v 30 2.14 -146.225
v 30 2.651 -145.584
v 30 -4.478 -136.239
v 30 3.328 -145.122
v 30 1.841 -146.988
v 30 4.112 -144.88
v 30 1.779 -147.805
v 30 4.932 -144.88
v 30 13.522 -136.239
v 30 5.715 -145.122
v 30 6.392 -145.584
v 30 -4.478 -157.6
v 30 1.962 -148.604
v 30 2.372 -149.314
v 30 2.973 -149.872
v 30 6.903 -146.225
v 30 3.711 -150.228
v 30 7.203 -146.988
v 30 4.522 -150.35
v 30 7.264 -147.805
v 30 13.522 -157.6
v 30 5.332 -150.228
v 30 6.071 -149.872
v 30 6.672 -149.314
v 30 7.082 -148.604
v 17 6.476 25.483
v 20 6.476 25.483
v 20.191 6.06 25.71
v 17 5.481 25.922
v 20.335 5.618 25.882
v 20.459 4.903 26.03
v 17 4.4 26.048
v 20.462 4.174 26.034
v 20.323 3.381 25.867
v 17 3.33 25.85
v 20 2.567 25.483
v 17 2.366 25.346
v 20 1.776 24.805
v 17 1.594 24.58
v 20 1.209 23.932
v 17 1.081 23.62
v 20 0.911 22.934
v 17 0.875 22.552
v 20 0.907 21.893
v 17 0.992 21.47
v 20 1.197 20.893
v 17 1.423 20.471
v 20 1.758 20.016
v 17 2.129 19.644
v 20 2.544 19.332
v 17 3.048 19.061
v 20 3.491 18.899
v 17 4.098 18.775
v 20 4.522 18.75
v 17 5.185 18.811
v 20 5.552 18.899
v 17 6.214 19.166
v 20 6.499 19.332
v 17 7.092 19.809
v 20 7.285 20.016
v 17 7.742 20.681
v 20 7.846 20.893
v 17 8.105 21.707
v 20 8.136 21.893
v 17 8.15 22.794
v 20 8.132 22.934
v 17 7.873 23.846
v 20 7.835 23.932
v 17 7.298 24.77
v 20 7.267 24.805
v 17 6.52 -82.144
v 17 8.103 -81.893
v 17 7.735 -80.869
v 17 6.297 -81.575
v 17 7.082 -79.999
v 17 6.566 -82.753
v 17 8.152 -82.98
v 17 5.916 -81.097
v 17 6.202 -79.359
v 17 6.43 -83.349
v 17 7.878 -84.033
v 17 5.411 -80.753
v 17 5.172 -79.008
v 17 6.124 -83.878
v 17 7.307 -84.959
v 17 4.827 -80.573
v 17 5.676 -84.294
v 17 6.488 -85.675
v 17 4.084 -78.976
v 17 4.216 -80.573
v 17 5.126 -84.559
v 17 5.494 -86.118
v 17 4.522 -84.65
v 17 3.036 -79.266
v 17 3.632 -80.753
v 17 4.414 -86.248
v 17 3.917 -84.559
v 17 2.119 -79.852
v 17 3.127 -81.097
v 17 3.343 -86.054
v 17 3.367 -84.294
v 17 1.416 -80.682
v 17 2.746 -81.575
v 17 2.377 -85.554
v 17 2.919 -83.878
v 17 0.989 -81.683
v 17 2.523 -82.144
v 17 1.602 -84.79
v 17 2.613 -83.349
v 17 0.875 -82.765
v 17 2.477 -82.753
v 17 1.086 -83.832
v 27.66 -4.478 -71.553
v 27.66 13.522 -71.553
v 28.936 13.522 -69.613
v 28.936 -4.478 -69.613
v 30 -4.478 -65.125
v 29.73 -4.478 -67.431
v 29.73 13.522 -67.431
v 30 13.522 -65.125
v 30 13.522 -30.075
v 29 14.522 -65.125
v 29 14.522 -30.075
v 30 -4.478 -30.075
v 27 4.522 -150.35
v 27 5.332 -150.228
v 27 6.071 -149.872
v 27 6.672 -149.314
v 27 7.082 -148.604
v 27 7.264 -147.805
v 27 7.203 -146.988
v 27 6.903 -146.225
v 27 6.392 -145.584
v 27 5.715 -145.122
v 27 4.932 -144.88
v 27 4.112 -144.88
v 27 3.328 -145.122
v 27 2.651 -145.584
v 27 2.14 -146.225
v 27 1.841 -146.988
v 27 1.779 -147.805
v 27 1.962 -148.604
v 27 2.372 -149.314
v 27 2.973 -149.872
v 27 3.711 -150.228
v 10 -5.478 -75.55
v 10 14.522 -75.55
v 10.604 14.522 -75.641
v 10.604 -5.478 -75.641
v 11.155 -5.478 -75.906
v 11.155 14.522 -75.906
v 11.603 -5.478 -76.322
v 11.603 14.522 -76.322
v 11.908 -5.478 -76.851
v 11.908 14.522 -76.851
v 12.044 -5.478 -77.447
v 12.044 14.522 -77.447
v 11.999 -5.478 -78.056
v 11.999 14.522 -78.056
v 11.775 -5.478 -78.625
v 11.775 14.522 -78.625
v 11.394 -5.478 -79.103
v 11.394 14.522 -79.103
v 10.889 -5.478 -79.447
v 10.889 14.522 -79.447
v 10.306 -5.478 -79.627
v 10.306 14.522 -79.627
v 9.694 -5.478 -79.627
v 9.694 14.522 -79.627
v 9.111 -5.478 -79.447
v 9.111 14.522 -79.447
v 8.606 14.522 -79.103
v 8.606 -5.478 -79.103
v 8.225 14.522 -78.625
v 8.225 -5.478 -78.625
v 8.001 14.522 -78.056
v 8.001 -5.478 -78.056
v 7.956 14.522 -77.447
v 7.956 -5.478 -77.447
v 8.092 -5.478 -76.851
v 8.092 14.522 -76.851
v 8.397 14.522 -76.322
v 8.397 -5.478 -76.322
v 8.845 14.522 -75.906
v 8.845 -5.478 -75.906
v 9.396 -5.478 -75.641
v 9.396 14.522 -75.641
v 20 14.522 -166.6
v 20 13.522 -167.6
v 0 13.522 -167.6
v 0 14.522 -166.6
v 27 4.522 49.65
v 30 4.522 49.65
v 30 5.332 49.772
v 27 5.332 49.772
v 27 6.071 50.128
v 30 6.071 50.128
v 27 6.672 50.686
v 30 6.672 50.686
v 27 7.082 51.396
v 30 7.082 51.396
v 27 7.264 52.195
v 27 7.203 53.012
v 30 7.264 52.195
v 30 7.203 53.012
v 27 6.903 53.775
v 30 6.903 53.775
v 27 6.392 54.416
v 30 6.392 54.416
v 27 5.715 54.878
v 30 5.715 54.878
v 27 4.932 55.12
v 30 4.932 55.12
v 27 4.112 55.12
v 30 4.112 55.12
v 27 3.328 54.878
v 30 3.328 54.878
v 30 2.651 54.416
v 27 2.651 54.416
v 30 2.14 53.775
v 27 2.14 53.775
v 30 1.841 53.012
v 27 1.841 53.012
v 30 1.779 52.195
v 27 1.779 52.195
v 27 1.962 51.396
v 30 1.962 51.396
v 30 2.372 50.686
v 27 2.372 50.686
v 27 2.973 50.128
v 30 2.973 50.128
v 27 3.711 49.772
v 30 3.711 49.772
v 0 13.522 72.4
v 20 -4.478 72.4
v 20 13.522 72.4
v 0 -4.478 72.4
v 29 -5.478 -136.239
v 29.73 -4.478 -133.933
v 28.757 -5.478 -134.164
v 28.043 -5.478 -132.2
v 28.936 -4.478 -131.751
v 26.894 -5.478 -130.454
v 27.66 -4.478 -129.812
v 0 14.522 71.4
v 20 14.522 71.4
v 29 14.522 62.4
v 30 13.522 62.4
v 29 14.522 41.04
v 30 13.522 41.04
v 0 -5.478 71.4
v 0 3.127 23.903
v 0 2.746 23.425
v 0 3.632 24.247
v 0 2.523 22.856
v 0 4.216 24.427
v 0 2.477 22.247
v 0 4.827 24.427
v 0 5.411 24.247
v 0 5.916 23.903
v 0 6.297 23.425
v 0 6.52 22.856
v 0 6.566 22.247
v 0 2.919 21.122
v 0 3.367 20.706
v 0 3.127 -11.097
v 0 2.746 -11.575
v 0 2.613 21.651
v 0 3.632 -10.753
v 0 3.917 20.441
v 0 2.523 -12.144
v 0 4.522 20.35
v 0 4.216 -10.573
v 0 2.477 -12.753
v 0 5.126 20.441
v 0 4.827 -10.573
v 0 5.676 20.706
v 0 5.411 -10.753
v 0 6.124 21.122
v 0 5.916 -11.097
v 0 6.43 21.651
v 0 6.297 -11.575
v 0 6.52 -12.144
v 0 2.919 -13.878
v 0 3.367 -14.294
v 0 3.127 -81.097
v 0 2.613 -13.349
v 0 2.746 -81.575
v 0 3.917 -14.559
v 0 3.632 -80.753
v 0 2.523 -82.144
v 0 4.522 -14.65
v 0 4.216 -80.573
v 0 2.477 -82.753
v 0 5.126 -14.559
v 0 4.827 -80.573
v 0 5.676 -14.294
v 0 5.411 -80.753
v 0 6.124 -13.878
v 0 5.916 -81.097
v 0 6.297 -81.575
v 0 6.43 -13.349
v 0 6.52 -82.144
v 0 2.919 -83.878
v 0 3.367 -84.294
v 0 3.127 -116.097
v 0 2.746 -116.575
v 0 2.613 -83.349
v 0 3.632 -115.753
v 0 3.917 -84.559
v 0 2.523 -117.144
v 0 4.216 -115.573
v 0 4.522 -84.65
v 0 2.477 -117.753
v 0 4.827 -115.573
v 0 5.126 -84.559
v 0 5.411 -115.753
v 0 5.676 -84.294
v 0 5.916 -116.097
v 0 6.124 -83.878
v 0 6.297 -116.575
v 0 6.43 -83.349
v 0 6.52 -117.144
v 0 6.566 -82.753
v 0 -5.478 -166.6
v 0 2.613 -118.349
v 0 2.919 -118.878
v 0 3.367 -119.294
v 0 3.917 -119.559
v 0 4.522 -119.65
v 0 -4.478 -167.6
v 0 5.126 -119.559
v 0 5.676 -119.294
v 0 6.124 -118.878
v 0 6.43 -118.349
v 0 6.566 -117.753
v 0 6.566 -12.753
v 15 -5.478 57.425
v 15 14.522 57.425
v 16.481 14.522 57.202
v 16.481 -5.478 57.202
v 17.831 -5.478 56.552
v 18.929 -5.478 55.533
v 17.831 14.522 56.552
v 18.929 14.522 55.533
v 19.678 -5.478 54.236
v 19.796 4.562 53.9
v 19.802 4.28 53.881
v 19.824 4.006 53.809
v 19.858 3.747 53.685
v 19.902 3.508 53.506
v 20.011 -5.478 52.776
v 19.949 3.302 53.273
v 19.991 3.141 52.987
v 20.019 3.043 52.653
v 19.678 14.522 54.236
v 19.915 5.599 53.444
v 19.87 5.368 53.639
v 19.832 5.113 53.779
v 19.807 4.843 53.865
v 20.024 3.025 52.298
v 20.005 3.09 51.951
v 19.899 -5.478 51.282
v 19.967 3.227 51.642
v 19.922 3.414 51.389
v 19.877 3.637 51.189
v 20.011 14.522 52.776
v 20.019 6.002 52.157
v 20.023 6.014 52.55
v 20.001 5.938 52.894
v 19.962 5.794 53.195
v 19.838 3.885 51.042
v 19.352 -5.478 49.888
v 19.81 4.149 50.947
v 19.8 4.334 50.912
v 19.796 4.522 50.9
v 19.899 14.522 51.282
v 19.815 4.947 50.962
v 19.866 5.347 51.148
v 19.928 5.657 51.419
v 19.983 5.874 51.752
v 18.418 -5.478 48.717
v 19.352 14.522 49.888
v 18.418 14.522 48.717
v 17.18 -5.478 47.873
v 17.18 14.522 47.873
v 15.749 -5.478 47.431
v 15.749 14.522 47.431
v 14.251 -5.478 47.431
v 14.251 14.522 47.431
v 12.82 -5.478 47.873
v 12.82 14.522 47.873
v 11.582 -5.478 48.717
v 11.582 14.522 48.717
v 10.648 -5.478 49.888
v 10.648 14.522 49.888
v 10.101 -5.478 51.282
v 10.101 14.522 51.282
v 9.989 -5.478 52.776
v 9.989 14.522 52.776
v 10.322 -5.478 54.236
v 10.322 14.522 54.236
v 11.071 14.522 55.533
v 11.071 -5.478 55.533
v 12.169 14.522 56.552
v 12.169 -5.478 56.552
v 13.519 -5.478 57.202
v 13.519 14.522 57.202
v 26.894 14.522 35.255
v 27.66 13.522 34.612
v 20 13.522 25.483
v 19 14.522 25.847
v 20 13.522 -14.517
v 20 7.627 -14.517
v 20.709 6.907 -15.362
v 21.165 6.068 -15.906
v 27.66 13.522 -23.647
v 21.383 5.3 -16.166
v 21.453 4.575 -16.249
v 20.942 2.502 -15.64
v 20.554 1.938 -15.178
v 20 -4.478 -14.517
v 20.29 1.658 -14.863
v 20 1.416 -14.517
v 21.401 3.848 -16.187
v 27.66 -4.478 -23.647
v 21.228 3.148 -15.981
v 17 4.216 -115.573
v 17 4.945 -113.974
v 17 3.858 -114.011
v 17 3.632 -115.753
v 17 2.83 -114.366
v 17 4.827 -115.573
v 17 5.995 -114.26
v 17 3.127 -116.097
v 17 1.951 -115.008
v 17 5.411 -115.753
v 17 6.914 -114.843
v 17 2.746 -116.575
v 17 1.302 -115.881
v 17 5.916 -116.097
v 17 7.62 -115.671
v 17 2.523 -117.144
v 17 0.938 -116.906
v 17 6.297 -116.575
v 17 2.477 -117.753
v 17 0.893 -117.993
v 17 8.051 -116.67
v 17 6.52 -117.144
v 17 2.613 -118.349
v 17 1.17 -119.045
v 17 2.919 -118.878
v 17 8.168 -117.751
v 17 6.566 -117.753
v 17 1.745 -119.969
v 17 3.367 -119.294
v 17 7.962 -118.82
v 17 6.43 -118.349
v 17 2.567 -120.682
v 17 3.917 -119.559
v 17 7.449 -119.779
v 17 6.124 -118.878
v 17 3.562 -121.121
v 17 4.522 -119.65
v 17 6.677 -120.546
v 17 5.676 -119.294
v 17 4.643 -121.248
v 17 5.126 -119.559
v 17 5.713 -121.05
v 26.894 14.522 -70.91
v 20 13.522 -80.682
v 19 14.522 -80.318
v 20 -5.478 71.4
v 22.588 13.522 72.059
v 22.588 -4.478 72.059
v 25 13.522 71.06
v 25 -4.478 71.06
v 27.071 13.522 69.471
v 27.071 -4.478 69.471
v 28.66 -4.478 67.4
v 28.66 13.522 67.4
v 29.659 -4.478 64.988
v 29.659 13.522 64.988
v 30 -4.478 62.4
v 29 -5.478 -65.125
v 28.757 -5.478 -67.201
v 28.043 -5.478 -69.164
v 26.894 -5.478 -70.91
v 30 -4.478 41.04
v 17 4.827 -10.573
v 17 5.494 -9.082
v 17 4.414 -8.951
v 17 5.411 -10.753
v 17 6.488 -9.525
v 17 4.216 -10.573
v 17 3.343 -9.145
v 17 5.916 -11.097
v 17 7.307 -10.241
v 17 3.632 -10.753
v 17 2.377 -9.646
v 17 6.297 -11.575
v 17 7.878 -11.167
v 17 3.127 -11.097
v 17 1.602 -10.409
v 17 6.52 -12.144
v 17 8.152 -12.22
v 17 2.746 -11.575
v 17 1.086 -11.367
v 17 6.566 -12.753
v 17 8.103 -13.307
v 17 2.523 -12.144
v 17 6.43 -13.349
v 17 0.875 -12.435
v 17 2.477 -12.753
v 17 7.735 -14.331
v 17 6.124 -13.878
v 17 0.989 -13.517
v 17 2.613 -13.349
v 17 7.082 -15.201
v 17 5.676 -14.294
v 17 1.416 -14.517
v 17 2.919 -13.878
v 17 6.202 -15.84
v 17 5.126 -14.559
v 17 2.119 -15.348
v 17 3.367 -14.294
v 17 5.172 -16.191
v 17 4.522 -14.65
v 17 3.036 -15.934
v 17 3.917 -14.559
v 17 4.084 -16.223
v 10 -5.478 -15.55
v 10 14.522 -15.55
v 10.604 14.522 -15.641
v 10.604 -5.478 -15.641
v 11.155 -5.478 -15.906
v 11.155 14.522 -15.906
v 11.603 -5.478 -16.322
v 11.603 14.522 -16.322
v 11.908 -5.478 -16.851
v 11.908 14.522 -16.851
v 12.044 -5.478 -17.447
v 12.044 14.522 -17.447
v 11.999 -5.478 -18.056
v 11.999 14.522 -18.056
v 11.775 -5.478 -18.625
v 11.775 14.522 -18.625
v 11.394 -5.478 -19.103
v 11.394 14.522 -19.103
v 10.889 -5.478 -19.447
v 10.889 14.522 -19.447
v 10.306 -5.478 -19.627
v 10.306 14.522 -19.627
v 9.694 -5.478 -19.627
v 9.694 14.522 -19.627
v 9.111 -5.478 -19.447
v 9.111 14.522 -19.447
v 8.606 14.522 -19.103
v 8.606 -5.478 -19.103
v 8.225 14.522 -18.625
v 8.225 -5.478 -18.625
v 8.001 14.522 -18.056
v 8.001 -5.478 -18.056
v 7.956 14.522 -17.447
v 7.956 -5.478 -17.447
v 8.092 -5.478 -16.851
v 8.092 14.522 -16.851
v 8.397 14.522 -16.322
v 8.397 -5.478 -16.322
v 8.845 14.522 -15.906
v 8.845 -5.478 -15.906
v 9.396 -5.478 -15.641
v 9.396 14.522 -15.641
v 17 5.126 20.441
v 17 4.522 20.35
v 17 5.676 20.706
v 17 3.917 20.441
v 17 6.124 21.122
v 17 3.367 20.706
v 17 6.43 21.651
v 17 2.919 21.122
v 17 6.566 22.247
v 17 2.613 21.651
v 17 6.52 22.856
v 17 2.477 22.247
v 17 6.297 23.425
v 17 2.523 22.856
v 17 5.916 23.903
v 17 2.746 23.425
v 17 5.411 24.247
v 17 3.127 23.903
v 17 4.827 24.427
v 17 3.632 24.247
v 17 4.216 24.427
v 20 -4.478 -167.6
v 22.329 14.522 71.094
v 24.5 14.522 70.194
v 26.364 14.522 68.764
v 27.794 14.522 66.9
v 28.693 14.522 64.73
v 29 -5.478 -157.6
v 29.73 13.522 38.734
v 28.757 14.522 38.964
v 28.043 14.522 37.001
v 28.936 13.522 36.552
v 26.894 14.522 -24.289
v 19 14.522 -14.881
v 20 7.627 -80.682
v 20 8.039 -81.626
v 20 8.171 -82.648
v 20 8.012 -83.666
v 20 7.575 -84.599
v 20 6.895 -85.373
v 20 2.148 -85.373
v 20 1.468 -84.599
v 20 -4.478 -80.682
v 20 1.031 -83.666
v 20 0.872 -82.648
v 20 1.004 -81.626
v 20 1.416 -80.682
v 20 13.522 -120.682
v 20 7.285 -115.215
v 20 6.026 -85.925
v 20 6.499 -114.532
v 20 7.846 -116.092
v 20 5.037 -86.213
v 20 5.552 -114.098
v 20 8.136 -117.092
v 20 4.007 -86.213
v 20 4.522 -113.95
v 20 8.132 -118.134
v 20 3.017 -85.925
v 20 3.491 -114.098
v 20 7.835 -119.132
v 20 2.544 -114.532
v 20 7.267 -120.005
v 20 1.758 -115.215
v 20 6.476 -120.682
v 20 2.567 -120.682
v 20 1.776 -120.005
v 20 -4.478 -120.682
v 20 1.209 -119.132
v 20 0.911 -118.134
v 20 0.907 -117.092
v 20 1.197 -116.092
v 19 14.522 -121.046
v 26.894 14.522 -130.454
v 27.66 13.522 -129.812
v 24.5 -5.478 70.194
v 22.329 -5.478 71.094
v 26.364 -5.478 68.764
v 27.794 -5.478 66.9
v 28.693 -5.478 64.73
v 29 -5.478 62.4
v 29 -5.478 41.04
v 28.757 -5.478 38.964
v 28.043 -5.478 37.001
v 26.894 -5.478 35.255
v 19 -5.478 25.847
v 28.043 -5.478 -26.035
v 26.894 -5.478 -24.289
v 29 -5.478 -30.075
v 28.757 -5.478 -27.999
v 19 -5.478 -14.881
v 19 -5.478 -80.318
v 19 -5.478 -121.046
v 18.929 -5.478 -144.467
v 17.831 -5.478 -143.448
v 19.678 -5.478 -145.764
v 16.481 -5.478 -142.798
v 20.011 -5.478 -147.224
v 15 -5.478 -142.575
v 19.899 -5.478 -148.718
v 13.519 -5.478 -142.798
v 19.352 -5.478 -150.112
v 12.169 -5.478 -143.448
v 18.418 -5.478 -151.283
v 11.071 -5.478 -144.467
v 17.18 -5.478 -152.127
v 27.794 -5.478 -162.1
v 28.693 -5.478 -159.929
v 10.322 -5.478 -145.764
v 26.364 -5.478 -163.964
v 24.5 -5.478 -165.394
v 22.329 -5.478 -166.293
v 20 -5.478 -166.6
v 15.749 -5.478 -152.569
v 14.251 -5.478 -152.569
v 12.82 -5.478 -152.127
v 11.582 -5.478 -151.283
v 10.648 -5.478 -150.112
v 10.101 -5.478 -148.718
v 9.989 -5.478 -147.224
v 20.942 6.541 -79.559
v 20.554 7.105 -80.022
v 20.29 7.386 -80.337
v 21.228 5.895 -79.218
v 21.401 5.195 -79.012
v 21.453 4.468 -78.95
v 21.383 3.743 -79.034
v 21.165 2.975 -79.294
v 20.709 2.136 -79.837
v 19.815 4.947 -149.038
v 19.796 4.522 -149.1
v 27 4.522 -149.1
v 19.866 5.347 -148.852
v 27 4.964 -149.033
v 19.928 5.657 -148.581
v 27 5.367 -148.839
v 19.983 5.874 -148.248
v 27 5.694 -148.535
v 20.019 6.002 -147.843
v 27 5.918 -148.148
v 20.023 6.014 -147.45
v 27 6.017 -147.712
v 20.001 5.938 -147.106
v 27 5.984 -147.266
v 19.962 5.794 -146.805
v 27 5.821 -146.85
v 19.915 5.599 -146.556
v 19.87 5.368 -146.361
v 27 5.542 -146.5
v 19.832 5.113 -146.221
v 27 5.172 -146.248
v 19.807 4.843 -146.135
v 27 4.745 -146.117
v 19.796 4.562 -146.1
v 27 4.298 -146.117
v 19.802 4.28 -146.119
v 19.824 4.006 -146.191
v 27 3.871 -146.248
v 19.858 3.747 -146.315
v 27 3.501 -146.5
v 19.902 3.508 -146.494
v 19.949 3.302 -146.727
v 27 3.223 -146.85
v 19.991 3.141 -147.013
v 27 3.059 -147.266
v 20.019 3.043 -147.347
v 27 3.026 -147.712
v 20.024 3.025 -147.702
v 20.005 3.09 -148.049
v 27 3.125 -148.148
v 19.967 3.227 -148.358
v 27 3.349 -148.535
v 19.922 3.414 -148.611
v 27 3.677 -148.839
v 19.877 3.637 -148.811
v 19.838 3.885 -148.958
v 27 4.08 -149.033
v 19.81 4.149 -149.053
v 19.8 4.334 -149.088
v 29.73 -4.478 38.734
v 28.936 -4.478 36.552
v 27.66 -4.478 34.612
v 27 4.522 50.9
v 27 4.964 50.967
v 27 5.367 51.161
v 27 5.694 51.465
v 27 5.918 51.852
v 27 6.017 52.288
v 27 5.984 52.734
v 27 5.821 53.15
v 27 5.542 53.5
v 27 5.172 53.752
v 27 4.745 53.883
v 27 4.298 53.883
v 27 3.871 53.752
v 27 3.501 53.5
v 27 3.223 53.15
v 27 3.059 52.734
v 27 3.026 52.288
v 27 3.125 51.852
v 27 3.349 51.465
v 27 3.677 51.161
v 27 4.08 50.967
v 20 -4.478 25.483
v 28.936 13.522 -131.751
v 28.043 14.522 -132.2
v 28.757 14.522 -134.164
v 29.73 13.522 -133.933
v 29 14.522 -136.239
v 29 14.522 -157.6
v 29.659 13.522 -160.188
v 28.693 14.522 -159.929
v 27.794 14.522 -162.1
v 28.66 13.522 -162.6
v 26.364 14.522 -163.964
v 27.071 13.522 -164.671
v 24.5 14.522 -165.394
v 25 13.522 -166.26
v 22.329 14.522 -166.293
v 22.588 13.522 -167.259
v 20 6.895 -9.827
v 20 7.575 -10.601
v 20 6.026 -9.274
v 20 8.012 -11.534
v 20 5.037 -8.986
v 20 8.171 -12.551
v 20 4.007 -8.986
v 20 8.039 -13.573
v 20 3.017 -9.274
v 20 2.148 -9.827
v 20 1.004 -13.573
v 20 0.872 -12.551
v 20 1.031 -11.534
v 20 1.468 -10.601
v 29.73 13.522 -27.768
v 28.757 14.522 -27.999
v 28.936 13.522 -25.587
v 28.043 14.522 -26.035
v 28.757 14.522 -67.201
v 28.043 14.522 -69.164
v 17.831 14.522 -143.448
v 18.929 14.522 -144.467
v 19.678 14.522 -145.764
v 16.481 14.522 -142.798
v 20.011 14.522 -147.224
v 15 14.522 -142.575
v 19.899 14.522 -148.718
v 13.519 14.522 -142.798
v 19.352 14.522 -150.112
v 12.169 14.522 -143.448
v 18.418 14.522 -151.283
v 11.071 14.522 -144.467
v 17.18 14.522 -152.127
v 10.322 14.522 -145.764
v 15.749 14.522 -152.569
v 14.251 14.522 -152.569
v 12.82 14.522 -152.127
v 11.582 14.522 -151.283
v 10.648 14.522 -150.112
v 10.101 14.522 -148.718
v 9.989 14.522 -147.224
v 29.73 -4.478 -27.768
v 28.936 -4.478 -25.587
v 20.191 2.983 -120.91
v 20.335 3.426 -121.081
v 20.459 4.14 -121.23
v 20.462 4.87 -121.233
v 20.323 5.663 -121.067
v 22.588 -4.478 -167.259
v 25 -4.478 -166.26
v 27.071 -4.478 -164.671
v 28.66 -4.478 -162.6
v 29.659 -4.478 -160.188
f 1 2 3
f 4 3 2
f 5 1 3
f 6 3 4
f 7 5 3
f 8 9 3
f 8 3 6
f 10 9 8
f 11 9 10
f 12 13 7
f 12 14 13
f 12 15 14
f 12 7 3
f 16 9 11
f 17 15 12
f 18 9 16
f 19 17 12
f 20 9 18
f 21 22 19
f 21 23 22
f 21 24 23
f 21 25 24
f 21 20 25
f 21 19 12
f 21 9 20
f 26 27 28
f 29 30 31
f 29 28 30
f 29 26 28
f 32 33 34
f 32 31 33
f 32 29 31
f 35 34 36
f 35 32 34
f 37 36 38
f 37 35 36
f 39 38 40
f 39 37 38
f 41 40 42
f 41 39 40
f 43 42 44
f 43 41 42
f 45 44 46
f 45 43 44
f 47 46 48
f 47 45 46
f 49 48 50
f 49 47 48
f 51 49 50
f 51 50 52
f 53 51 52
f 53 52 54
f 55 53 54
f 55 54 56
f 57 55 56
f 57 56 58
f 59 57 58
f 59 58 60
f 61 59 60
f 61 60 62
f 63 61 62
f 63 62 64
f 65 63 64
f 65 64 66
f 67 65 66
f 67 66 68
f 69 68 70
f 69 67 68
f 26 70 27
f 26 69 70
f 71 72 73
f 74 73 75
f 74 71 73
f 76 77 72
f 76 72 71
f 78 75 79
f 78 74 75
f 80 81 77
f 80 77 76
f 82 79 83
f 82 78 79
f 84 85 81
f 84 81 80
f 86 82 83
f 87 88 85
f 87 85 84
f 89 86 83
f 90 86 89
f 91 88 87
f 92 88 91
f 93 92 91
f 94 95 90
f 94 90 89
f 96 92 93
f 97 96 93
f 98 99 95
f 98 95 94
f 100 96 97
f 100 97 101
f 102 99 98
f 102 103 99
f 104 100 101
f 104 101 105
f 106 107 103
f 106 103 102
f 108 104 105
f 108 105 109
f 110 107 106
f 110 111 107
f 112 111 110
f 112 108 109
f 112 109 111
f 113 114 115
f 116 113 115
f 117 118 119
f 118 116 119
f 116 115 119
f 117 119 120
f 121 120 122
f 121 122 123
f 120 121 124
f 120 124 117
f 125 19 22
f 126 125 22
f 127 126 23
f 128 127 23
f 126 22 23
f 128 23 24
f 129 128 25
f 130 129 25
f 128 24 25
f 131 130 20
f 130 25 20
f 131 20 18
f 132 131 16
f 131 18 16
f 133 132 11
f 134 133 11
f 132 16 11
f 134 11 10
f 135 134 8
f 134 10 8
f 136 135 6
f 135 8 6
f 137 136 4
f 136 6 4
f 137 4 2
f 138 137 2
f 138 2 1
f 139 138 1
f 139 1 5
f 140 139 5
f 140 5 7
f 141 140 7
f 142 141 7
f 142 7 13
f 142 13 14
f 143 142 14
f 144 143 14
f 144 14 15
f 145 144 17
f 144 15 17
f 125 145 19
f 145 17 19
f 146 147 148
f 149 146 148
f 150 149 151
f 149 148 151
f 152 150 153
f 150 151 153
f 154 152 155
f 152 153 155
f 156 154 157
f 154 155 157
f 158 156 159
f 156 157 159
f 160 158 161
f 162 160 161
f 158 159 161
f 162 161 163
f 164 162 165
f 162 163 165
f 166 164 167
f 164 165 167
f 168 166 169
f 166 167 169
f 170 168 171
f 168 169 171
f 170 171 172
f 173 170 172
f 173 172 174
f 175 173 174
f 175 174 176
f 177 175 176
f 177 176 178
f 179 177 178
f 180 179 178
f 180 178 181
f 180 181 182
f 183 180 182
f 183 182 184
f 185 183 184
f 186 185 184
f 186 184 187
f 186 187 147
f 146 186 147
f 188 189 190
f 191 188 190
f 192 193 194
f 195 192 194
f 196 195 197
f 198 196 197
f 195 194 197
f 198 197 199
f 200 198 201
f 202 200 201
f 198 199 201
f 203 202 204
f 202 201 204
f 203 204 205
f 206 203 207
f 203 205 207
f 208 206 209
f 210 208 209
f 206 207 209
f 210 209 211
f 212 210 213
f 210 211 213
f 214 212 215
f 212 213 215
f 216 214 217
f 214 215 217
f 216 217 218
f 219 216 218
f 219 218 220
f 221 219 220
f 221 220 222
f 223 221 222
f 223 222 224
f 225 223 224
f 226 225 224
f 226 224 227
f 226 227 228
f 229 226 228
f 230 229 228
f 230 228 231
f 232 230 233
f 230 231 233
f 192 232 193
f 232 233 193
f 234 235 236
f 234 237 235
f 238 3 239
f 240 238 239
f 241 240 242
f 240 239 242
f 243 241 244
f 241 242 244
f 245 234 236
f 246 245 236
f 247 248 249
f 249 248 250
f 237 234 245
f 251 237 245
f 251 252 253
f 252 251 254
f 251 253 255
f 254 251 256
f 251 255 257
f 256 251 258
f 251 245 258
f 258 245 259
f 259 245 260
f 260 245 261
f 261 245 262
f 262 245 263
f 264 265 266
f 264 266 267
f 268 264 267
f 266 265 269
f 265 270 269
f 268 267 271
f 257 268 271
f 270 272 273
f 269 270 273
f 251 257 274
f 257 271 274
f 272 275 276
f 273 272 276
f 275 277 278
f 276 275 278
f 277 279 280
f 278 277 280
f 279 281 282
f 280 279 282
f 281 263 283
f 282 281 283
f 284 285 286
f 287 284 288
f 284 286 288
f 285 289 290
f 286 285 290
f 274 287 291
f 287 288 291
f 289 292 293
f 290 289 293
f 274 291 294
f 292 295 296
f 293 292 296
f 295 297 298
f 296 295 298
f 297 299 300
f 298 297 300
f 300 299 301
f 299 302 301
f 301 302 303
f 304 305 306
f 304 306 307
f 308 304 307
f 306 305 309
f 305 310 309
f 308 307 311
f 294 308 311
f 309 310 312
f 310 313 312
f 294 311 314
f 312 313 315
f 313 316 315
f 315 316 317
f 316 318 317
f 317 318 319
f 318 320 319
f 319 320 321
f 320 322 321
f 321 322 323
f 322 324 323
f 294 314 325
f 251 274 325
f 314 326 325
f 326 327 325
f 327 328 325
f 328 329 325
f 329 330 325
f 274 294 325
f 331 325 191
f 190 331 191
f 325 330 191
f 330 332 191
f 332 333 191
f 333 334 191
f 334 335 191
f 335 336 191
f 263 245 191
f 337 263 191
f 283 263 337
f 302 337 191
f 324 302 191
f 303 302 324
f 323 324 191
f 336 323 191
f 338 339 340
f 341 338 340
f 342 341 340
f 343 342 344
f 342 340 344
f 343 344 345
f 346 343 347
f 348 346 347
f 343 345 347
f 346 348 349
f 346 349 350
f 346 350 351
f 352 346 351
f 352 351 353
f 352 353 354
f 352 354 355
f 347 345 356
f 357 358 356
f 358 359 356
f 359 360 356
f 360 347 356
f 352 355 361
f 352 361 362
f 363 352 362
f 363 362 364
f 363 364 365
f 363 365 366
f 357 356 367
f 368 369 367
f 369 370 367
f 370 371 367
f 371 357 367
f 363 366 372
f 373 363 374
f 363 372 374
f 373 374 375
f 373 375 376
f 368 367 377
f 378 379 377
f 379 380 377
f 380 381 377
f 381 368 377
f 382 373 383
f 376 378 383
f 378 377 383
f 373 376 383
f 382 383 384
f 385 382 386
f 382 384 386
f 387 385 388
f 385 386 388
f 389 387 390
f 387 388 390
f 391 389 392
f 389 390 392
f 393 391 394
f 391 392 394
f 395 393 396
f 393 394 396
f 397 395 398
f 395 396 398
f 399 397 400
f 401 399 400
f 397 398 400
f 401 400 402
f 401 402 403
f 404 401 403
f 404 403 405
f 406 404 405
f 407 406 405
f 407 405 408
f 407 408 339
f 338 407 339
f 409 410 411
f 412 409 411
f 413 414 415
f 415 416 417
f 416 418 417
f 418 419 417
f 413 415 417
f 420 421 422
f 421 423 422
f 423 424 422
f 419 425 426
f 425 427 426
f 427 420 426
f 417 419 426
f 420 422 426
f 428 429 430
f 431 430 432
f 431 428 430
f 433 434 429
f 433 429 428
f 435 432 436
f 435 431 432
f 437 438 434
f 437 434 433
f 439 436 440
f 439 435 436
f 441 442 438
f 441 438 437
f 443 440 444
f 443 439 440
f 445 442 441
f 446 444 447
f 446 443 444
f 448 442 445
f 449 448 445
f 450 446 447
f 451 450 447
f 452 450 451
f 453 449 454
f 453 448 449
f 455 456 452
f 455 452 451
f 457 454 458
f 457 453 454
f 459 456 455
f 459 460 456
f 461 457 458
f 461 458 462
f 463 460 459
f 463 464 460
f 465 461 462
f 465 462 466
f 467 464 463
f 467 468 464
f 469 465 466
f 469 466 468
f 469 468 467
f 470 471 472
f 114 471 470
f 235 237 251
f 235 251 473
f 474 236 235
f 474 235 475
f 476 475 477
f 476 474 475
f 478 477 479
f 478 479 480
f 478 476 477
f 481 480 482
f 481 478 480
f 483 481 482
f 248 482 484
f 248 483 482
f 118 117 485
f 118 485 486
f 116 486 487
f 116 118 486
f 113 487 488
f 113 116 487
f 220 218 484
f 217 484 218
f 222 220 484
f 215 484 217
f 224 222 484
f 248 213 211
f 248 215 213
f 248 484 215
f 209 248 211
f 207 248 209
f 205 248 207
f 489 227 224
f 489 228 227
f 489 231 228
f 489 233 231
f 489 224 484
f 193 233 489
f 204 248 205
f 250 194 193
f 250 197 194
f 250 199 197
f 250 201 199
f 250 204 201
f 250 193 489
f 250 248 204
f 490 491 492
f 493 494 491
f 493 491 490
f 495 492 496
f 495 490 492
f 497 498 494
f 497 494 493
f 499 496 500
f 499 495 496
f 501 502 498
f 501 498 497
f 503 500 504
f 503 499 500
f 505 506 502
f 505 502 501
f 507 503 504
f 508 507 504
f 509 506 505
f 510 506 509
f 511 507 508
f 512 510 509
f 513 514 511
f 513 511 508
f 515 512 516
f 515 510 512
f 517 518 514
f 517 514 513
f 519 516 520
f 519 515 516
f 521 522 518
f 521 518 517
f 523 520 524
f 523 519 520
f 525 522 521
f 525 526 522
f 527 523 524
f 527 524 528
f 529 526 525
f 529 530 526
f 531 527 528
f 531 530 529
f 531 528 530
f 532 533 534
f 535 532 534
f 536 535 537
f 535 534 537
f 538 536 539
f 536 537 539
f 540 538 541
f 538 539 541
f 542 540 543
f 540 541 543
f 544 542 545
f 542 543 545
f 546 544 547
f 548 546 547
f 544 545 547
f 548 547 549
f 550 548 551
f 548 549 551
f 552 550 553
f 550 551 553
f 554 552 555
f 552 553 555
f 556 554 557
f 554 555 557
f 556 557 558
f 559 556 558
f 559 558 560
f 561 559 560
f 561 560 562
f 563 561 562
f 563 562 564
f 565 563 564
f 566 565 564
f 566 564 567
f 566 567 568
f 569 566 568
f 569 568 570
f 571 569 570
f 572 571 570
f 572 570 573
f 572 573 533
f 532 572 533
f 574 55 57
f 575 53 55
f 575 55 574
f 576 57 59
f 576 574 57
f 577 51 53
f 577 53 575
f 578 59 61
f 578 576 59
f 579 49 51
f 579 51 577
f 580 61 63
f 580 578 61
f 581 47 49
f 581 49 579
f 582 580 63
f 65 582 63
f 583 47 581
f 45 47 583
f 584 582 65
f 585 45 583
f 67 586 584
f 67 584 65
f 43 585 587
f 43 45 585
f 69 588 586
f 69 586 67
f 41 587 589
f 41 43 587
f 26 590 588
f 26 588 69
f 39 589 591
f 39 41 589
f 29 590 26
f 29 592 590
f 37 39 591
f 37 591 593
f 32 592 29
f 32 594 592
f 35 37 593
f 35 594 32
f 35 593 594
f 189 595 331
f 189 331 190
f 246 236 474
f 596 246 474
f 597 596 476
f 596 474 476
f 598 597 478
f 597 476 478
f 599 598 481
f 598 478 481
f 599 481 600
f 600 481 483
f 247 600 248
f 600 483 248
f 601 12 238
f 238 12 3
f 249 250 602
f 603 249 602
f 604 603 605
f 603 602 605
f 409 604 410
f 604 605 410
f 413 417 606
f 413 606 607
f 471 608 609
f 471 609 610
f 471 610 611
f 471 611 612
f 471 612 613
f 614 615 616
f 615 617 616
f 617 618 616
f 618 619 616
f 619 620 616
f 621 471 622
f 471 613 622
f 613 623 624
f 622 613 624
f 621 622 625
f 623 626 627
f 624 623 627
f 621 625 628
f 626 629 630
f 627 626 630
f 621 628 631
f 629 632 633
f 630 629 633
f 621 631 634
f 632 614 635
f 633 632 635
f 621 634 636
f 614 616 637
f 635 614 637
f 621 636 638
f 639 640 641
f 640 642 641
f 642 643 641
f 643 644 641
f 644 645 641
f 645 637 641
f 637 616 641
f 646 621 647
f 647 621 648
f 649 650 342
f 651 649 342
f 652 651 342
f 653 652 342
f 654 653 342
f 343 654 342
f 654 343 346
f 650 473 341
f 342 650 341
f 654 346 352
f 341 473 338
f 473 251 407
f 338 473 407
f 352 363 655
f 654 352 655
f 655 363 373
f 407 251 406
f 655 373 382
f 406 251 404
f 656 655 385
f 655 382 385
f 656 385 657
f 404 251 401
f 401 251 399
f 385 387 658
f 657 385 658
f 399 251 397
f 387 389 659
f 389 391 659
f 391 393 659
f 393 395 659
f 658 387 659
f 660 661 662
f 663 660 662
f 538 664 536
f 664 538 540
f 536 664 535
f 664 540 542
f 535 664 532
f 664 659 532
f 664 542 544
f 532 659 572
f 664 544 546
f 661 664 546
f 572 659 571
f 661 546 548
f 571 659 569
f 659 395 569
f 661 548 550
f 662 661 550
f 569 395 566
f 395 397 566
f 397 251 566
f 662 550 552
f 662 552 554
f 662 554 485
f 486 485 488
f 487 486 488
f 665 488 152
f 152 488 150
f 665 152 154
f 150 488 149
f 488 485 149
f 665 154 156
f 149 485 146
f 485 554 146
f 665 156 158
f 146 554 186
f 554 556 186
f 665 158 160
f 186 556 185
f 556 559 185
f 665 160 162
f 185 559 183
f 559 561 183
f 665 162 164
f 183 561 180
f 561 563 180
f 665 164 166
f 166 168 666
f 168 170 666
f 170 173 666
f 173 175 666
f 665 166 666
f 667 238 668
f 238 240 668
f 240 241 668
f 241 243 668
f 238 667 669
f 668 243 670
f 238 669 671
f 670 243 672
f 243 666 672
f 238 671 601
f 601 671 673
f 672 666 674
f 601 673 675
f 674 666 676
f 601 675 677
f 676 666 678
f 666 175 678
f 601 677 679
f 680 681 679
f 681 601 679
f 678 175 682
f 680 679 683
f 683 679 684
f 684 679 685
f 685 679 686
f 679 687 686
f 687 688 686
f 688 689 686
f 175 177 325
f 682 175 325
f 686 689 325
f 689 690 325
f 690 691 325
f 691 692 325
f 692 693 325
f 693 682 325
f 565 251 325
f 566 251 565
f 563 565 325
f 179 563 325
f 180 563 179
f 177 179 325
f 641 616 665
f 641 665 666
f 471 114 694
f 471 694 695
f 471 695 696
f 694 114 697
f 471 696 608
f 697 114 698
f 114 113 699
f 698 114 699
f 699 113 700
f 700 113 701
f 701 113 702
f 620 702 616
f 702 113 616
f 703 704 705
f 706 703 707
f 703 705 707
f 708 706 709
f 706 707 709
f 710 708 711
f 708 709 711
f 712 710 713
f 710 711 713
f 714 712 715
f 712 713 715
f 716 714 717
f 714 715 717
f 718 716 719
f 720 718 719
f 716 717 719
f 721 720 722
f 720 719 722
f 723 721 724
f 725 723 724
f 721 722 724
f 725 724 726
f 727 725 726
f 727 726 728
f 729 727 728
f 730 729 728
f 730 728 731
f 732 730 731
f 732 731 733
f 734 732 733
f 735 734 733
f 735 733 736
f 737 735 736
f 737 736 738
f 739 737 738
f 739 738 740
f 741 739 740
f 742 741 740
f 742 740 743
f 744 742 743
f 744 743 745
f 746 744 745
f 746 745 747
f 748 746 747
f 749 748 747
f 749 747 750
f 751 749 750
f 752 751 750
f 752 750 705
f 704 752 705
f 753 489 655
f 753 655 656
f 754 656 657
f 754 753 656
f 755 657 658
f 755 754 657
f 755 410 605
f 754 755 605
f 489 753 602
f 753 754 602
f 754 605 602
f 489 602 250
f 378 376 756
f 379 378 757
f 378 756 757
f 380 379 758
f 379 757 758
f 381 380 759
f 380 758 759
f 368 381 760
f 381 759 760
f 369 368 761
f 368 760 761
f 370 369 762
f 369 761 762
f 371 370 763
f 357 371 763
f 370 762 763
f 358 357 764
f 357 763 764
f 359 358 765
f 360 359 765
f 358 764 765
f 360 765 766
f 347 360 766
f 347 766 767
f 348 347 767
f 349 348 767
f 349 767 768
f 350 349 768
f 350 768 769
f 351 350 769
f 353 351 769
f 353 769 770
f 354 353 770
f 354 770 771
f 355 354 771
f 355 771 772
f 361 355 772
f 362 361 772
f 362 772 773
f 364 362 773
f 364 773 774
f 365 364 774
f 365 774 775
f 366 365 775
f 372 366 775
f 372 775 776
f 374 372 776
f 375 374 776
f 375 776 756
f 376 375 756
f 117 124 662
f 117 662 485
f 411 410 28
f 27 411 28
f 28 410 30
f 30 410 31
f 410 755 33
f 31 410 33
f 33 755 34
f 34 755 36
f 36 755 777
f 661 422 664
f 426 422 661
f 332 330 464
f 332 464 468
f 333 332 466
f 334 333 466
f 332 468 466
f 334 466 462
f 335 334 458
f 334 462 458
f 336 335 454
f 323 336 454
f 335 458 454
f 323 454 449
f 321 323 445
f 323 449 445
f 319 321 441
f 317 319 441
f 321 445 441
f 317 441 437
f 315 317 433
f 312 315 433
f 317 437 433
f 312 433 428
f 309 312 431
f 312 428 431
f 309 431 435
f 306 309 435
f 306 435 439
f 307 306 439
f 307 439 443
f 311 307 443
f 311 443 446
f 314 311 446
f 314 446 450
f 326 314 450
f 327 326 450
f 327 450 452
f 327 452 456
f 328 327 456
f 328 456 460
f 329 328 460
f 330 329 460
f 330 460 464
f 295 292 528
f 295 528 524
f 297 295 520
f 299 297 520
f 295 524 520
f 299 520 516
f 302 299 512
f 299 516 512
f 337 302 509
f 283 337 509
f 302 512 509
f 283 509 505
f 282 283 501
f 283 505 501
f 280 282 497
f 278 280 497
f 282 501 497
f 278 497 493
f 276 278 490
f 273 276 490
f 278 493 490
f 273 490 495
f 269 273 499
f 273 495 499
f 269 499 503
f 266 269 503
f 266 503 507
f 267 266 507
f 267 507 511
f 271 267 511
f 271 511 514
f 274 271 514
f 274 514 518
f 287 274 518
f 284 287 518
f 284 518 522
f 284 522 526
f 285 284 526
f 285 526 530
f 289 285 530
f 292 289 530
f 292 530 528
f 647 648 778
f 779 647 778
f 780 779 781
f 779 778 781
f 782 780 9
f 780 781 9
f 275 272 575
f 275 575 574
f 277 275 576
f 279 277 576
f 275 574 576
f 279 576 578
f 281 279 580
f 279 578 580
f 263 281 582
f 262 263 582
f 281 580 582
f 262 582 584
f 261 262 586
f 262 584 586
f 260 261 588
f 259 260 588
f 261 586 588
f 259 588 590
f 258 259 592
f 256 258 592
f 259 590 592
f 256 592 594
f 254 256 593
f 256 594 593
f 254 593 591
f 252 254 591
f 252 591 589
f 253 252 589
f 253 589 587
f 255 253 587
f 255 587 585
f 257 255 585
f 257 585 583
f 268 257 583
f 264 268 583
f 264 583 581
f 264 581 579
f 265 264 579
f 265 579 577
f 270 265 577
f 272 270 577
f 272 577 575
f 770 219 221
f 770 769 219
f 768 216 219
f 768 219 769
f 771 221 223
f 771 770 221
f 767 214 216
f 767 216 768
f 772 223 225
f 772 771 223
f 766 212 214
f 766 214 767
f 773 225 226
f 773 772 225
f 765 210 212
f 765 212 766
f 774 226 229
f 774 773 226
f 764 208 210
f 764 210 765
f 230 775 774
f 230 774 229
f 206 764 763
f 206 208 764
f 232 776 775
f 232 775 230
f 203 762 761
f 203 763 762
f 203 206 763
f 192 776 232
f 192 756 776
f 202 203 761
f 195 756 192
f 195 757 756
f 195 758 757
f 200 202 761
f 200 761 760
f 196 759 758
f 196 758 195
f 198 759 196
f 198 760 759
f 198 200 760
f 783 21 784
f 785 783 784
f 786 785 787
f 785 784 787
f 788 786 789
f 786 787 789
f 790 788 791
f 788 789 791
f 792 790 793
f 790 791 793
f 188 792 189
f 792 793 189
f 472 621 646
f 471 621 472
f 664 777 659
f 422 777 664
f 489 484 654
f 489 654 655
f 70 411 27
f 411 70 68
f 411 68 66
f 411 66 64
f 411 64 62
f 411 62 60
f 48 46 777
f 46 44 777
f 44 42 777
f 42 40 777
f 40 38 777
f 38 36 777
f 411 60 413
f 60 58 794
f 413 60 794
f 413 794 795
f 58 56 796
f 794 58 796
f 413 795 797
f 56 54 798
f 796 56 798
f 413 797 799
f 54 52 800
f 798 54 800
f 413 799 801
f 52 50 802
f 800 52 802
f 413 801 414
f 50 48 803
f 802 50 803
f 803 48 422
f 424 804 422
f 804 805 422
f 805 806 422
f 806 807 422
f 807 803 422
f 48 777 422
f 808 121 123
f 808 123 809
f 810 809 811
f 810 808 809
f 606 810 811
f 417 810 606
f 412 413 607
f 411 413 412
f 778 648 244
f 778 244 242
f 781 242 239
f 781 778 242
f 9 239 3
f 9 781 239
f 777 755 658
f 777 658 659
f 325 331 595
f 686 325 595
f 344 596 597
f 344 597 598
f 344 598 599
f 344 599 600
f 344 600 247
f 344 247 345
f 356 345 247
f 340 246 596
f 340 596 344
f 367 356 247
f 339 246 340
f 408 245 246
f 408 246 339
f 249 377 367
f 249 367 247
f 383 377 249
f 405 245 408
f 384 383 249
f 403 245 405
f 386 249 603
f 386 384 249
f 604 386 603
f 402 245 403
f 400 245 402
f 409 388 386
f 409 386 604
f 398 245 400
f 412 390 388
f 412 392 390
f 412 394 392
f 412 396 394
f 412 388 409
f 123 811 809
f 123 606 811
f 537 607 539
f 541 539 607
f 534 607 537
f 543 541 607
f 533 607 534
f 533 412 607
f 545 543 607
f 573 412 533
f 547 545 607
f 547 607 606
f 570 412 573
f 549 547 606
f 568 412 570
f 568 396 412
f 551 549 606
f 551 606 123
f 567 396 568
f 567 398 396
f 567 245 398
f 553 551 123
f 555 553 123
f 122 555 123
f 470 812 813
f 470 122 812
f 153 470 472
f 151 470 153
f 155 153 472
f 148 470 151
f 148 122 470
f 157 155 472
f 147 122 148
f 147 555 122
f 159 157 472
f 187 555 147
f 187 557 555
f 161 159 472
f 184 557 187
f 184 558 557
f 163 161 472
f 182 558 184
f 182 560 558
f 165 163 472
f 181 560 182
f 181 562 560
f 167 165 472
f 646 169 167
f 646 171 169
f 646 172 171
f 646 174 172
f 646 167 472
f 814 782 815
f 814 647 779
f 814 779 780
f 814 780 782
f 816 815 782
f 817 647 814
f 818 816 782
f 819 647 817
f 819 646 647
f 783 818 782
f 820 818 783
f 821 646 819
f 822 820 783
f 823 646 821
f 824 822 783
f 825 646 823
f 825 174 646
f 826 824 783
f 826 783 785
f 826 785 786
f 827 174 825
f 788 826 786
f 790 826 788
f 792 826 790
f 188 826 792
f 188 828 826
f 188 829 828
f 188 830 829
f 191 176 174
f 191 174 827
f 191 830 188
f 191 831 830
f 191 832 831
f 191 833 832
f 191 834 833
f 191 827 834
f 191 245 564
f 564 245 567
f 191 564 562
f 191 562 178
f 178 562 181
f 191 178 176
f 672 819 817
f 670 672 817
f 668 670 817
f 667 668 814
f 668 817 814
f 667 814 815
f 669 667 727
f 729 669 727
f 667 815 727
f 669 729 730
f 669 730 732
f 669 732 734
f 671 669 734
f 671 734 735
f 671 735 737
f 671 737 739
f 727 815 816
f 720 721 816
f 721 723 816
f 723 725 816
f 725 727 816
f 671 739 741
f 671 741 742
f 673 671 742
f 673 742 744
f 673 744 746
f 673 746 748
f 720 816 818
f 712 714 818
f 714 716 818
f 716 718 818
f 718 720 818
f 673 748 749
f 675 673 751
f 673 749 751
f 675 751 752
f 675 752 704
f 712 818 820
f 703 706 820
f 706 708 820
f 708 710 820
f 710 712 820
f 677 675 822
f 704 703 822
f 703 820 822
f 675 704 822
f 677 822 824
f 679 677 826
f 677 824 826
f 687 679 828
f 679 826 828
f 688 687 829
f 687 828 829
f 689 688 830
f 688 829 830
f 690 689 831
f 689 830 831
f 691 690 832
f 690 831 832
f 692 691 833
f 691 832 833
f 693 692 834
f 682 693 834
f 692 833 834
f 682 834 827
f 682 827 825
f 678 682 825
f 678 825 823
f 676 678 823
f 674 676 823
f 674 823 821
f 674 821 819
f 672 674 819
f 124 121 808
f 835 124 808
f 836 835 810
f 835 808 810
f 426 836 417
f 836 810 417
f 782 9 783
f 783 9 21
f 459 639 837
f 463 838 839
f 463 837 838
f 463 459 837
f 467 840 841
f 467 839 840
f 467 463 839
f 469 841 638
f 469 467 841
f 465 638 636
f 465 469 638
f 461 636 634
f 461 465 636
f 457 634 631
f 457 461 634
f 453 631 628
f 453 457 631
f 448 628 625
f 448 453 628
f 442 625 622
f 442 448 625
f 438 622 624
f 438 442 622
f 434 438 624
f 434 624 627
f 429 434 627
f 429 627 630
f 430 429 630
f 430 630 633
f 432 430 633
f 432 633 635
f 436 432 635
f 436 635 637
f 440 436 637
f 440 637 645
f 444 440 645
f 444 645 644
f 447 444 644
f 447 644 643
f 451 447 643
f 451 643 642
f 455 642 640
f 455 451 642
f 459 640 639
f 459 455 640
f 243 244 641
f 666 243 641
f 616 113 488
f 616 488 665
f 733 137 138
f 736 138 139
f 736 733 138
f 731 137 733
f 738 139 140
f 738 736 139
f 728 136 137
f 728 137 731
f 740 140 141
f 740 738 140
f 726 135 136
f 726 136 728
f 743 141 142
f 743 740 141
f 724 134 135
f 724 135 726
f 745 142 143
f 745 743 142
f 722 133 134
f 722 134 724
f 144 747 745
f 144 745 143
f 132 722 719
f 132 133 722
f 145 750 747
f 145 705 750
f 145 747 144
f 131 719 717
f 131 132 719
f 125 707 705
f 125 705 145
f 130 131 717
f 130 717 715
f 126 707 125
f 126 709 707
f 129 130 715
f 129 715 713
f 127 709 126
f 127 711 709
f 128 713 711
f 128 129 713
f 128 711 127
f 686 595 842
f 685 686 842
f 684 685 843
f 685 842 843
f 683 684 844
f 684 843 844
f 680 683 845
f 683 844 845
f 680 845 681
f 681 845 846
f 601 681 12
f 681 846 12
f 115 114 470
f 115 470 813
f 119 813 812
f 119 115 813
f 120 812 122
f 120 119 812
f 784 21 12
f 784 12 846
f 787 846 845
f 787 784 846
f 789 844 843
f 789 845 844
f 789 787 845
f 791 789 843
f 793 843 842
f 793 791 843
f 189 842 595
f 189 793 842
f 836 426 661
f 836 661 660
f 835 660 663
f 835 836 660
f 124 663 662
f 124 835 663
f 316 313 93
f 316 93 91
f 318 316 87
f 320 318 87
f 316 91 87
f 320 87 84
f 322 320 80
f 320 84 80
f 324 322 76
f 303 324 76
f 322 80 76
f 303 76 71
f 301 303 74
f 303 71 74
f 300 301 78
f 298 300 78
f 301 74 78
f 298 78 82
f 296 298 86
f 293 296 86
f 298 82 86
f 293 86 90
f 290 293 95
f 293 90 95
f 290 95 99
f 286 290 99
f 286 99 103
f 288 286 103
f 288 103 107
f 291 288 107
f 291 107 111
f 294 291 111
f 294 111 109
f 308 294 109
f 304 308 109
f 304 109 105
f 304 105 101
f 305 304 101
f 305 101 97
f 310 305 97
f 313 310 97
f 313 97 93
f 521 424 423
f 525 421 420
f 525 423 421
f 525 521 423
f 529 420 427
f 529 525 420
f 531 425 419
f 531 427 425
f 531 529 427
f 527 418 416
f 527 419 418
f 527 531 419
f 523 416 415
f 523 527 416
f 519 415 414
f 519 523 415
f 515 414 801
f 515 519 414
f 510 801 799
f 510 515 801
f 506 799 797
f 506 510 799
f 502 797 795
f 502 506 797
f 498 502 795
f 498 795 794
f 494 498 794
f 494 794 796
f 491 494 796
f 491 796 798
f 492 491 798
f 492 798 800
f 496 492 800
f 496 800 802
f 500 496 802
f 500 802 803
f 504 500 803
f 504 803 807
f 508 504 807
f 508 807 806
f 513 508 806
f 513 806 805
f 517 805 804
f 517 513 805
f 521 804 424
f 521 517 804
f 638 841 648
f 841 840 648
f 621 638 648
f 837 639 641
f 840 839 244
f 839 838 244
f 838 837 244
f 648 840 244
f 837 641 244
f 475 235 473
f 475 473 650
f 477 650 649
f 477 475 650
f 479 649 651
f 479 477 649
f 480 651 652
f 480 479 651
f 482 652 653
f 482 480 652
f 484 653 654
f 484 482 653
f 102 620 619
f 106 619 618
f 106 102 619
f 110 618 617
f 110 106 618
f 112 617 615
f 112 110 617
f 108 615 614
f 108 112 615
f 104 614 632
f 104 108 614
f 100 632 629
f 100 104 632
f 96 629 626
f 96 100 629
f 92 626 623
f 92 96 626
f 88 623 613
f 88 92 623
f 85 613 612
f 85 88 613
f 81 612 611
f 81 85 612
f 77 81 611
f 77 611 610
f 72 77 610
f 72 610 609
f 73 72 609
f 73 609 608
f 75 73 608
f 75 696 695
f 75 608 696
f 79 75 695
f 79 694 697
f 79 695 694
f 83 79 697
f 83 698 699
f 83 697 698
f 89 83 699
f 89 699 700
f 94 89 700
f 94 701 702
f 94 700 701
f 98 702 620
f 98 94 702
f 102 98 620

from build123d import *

# Parameters (mm, degrees)
SKETCH1_W               = 240
SKETCH1_H               = 20
BOSS_EXTRUDE1_DEPTH     = 30
SKETCH2_R               = 5.025
CUT_EXTRUDE1_DEPTH      = 20
SKETCH3_R               = 2.05
CUT_EXTRUDE2_DEPTH      = 30
CUT_EXTRUDE5_DEPTH      = 32.5
FILLET1_R               = 10
FILLET2_R               = 10
CHAMFER1_SIZE           = 1
CHAMFER2_SIZE           = 1
CUT_EXTRUDE9_DEPTH      = 3
CUT_EXTRUDE9_DEPTH_BACK = 3
SKETCH10_R              = 3.65
SKETCH11_R              = 1.5
CUT_EXTRUDE10_DEPTH     = 13
SKETCH12_R              = 2.75
SKETCH12_R_2            = 1.5
CUT_EXTRUDE11_DEPTH     = 3
SKETCH16_R              = 2.05
CUT_EXTRUDE12_DEPTH     = 40


with BuildPart() as part:
    # Sketch1 → Boss-Extrude1 (new body)
    with BuildSketch(Plane(origin=(0, 0, 0), x_dir=(0, 0, -1), z_dir=(1, 0, 0))):
        with Locations((47.599764496, 4.521643901)):
            Rectangle(SKETCH1_W, SKETCH1_H)
    extrude(amount=BOSS_EXTRUDE1_DEPTH)

    # Sketch2 → Cut-Extrude1 (cut)
    with BuildSketch(Plane(origin=(0, 14.521643901, 0), x_dir=(1, 0, 0), z_dir=(0, 1, 0))):
        with Locations(Location((15, 147.599764496, 0), (0, 0, 270))):
            Circle(SKETCH2_R)
        with Locations(Location((15, -52.400235504, 0), (0, 0, 270))):
            Circle(SKETCH2_R)
    extrude(amount=-CUT_EXTRUDE1_DEPTH, mode=Mode.SUBTRACT)

    # Sketch3 → Cut-Extrude2 (cut)
    with BuildSketch(Plane(origin=(30, 0, 0), x_dir=(0, 0, -1), z_dir=(1, 0, 0))):
        with Locations((117.599764496, 4.521643901)):
            Circle(SKETCH3_R)
        with Locations((-22.400235504, 4.521643901)):
            Circle(SKETCH3_R)
        with Locations((12.599764496, 4.521643901)):
            Circle(SKETCH3_R)
        with Locations((82.599764496, 4.521643901)):
            Circle(SKETCH3_R)
    extrude(amount=-CUT_EXTRUDE2_DEPTH, mode=Mode.SUBTRACT)

    # Sketch6 → Cut-Extrude5 (cut)
    with BuildSketch(Plane.XZ.offset(5.478356099)):
        Polygon((30, 37.400235504), (20, 25.482699578), (20, -14.517300422), (30, -26.434836348), align=None)
        Polygon((30, -68.764692644), (20, -80.68222857), (20, -120.68222857), (30, -132.599764496), align=None)
    extrude(amount=-CUT_EXTRUDE5_DEPTH, mode=Mode.SUBTRACT)

    # Fillet1
    fillet1_edges = [part.edges().sort_by_distance(p)[0] for p in [
        (30, 4.521643901, -26.434836348),
        (30, 4.521643901, -68.764692644),
    ]]
    fillet(fillet1_edges, radius=FILLET1_R)

    # Fillet2
    fillet2_edges = [part.edges().sort_by_distance(p)[0] for p in [
        (30, 4.521643901, 72.400235504),
        (30, 4.521643901, -167.599764496),
        (30, 4.521643901, 37.400235504),
        (30, 4.521643901, -132.599764496),
    ]]
    fillet(fillet2_edges, radius=FILLET2_R)

    # Chamfer1
    chamfer1_edges = [part.edges().sort_by_distance(p)[0] for p in [
        (30, -5.478356099, 51.720086675),
        (23.830222216, -5.478356099, 30.047380664),
        (10, -5.478356099, 72.400235504),
        (10, -5.478356099, -167.599764496),
        (30, -5.478356099, -146.919615667),
        (29.396926208, -5.478356099, 37.619736413),
        (29.396926208, -5.478356099, -132.819265405),
        (27.071067812, -5.478356099, -164.670832308),
        (27.071067812, -5.478356099, 69.471303316),
        (20, -5.478356099, 5.482699578),
        (23.830222216, -5.478356099, -19.081981508),
        (20, -5.478356099, -100.68222857),
        (23.830222216, -5.478356099, -125.246909656),
        (30, -5.478356099, -47.599764496),
        (23.830222216, -5.478356099, -76.117547484),
        (29.396926208, -5.478356099, -68.545191735),
        (29.396926208, -5.478356099, -26.654337257),
    ]]
    chamfer(chamfer1_edges, length=CHAMFER1_SIZE)

    # Chamfer2
    chamfer2_edges = [part.edges().sort_by_distance(p)[0] for p in [
        (29.396926208, 14.521643901, -26.654337257),
        (30, 14.521643901, 51.720086675),
        (10, 14.521643901, 72.400235504),
        (30, 14.521643901, -146.919615667),
        (10, 14.521643901, -167.599764496),
        (23.830222216, 14.521643901, 30.047380664),
        (29.396926208, 14.521643901, 37.619736413),
        (29.396926208, 14.521643901, -132.819265405),
        (27.071067812, 14.521643901, -164.670832308),
        (27.071067812, 14.521643901, 69.471303316),
        (23.830222216, 14.521643901, -19.081981508),
        (20, 14.521643901, 5.482699578),
        (23.830222216, 14.521643901, -125.246909656),
        (20, 14.521643901, -100.68222857),
        (30, 14.521643901, -47.599764496),
        (23.830222216, 14.521643901, -76.117547484),
        (29.396926208, 14.521643901, -68.545191735),
    ]]
    chamfer(chamfer2_edges, length=CHAMFER2_SIZE)

    # Sketch10 → Cut-Extrude9 (cut, two sides: drawn at the far end of the back side and taken through both)
    with BuildSketch(Plane(origin=(20, 0, 0), x_dir=(0, 0, -1), z_dir=(1, 0, 0)).offset(-CUT_EXTRUDE9_DEPTH_BACK)):
        with Locations(Location((12.599764496, 4.521643901, 0), (0, 0, 301.691963515))):
            Circle(SKETCH10_R)
        with Locations(Location((-22.400235504, 4.521643901, 0), (0, 0, 147.61954983))):
            Circle(SKETCH10_R)
        with Locations(Location((82.599764496, 4.521643901, 0), (0, 0, 238.308036485))):
            Circle(SKETCH10_R)
        with Locations(Location((117.599764496, 4.521643901, 0), (0, 0, 327.61954983))):
            Circle(SKETCH10_R)
    extrude(amount=CUT_EXTRUDE9_DEPTH + CUT_EXTRUDE9_DEPTH_BACK, mode=Mode.SUBTRACT)

    # Sketch11 → Cut-Extrude10 (cut)
    with BuildSketch(Plane(origin=(30, 0, 0), x_dir=(0, 0, -1), z_dir=(1, 0, 0))):
        with Locations((147.599764496, 4.521643901)):
            Circle(SKETCH11_R)
        with Locations((-52.400235504, 4.521643901)):
            Circle(SKETCH11_R)
    extrude(amount=-CUT_EXTRUDE10_DEPTH, mode=Mode.SUBTRACT)

    # Sketch12 → Cut-Extrude11 (cut)
    # profile 1 of 2: a face of its own
    with BuildSketch(Plane(origin=(30, 0, 0), x_dir=(0, 0, -1), z_dir=(1, 0, 0))):
        with Locations((-52.400235504, 4.521643901)):
            Circle(SKETCH12_R)
        with Locations((-52.400235504, 4.521643901)):
            Circle(SKETCH12_R_2, mode=Mode.SUBTRACT)
    # profile 2 of 2: a face of its own
    with BuildSketch(Plane(origin=(30, 0, 0), x_dir=(0, 0, -1), z_dir=(1, 0, 0))):
        with Locations((147.599764496, 4.521643901)):
            Circle(SKETCH12_R)
        with Locations((147.599764496, 4.521643901)):
            Circle(SKETCH12_R_2, mode=Mode.SUBTRACT)
    extrude(amount=-CUT_EXTRUDE11_DEPTH, mode=Mode.SUBTRACT)

    # Sketch16 → Cut-Extrude12 (cut)
    with BuildSketch(Plane(origin=(0, 14.521643901, 0), x_dir=(1, 0, 0), z_dir=(0, 1, 0))):
        with Locations(Location((10, 77.599764496, 0), (0, 0, 270))):
            Circle(SKETCH16_R)
        with Locations(Location((10, 17.599764496, 0), (0, 0, 270))):
            Circle(SKETCH16_R)
    extrude(amount=-CUT_EXTRUDE12_DEPTH, mode=Mode.SUBTRACT)


solid = part.part
